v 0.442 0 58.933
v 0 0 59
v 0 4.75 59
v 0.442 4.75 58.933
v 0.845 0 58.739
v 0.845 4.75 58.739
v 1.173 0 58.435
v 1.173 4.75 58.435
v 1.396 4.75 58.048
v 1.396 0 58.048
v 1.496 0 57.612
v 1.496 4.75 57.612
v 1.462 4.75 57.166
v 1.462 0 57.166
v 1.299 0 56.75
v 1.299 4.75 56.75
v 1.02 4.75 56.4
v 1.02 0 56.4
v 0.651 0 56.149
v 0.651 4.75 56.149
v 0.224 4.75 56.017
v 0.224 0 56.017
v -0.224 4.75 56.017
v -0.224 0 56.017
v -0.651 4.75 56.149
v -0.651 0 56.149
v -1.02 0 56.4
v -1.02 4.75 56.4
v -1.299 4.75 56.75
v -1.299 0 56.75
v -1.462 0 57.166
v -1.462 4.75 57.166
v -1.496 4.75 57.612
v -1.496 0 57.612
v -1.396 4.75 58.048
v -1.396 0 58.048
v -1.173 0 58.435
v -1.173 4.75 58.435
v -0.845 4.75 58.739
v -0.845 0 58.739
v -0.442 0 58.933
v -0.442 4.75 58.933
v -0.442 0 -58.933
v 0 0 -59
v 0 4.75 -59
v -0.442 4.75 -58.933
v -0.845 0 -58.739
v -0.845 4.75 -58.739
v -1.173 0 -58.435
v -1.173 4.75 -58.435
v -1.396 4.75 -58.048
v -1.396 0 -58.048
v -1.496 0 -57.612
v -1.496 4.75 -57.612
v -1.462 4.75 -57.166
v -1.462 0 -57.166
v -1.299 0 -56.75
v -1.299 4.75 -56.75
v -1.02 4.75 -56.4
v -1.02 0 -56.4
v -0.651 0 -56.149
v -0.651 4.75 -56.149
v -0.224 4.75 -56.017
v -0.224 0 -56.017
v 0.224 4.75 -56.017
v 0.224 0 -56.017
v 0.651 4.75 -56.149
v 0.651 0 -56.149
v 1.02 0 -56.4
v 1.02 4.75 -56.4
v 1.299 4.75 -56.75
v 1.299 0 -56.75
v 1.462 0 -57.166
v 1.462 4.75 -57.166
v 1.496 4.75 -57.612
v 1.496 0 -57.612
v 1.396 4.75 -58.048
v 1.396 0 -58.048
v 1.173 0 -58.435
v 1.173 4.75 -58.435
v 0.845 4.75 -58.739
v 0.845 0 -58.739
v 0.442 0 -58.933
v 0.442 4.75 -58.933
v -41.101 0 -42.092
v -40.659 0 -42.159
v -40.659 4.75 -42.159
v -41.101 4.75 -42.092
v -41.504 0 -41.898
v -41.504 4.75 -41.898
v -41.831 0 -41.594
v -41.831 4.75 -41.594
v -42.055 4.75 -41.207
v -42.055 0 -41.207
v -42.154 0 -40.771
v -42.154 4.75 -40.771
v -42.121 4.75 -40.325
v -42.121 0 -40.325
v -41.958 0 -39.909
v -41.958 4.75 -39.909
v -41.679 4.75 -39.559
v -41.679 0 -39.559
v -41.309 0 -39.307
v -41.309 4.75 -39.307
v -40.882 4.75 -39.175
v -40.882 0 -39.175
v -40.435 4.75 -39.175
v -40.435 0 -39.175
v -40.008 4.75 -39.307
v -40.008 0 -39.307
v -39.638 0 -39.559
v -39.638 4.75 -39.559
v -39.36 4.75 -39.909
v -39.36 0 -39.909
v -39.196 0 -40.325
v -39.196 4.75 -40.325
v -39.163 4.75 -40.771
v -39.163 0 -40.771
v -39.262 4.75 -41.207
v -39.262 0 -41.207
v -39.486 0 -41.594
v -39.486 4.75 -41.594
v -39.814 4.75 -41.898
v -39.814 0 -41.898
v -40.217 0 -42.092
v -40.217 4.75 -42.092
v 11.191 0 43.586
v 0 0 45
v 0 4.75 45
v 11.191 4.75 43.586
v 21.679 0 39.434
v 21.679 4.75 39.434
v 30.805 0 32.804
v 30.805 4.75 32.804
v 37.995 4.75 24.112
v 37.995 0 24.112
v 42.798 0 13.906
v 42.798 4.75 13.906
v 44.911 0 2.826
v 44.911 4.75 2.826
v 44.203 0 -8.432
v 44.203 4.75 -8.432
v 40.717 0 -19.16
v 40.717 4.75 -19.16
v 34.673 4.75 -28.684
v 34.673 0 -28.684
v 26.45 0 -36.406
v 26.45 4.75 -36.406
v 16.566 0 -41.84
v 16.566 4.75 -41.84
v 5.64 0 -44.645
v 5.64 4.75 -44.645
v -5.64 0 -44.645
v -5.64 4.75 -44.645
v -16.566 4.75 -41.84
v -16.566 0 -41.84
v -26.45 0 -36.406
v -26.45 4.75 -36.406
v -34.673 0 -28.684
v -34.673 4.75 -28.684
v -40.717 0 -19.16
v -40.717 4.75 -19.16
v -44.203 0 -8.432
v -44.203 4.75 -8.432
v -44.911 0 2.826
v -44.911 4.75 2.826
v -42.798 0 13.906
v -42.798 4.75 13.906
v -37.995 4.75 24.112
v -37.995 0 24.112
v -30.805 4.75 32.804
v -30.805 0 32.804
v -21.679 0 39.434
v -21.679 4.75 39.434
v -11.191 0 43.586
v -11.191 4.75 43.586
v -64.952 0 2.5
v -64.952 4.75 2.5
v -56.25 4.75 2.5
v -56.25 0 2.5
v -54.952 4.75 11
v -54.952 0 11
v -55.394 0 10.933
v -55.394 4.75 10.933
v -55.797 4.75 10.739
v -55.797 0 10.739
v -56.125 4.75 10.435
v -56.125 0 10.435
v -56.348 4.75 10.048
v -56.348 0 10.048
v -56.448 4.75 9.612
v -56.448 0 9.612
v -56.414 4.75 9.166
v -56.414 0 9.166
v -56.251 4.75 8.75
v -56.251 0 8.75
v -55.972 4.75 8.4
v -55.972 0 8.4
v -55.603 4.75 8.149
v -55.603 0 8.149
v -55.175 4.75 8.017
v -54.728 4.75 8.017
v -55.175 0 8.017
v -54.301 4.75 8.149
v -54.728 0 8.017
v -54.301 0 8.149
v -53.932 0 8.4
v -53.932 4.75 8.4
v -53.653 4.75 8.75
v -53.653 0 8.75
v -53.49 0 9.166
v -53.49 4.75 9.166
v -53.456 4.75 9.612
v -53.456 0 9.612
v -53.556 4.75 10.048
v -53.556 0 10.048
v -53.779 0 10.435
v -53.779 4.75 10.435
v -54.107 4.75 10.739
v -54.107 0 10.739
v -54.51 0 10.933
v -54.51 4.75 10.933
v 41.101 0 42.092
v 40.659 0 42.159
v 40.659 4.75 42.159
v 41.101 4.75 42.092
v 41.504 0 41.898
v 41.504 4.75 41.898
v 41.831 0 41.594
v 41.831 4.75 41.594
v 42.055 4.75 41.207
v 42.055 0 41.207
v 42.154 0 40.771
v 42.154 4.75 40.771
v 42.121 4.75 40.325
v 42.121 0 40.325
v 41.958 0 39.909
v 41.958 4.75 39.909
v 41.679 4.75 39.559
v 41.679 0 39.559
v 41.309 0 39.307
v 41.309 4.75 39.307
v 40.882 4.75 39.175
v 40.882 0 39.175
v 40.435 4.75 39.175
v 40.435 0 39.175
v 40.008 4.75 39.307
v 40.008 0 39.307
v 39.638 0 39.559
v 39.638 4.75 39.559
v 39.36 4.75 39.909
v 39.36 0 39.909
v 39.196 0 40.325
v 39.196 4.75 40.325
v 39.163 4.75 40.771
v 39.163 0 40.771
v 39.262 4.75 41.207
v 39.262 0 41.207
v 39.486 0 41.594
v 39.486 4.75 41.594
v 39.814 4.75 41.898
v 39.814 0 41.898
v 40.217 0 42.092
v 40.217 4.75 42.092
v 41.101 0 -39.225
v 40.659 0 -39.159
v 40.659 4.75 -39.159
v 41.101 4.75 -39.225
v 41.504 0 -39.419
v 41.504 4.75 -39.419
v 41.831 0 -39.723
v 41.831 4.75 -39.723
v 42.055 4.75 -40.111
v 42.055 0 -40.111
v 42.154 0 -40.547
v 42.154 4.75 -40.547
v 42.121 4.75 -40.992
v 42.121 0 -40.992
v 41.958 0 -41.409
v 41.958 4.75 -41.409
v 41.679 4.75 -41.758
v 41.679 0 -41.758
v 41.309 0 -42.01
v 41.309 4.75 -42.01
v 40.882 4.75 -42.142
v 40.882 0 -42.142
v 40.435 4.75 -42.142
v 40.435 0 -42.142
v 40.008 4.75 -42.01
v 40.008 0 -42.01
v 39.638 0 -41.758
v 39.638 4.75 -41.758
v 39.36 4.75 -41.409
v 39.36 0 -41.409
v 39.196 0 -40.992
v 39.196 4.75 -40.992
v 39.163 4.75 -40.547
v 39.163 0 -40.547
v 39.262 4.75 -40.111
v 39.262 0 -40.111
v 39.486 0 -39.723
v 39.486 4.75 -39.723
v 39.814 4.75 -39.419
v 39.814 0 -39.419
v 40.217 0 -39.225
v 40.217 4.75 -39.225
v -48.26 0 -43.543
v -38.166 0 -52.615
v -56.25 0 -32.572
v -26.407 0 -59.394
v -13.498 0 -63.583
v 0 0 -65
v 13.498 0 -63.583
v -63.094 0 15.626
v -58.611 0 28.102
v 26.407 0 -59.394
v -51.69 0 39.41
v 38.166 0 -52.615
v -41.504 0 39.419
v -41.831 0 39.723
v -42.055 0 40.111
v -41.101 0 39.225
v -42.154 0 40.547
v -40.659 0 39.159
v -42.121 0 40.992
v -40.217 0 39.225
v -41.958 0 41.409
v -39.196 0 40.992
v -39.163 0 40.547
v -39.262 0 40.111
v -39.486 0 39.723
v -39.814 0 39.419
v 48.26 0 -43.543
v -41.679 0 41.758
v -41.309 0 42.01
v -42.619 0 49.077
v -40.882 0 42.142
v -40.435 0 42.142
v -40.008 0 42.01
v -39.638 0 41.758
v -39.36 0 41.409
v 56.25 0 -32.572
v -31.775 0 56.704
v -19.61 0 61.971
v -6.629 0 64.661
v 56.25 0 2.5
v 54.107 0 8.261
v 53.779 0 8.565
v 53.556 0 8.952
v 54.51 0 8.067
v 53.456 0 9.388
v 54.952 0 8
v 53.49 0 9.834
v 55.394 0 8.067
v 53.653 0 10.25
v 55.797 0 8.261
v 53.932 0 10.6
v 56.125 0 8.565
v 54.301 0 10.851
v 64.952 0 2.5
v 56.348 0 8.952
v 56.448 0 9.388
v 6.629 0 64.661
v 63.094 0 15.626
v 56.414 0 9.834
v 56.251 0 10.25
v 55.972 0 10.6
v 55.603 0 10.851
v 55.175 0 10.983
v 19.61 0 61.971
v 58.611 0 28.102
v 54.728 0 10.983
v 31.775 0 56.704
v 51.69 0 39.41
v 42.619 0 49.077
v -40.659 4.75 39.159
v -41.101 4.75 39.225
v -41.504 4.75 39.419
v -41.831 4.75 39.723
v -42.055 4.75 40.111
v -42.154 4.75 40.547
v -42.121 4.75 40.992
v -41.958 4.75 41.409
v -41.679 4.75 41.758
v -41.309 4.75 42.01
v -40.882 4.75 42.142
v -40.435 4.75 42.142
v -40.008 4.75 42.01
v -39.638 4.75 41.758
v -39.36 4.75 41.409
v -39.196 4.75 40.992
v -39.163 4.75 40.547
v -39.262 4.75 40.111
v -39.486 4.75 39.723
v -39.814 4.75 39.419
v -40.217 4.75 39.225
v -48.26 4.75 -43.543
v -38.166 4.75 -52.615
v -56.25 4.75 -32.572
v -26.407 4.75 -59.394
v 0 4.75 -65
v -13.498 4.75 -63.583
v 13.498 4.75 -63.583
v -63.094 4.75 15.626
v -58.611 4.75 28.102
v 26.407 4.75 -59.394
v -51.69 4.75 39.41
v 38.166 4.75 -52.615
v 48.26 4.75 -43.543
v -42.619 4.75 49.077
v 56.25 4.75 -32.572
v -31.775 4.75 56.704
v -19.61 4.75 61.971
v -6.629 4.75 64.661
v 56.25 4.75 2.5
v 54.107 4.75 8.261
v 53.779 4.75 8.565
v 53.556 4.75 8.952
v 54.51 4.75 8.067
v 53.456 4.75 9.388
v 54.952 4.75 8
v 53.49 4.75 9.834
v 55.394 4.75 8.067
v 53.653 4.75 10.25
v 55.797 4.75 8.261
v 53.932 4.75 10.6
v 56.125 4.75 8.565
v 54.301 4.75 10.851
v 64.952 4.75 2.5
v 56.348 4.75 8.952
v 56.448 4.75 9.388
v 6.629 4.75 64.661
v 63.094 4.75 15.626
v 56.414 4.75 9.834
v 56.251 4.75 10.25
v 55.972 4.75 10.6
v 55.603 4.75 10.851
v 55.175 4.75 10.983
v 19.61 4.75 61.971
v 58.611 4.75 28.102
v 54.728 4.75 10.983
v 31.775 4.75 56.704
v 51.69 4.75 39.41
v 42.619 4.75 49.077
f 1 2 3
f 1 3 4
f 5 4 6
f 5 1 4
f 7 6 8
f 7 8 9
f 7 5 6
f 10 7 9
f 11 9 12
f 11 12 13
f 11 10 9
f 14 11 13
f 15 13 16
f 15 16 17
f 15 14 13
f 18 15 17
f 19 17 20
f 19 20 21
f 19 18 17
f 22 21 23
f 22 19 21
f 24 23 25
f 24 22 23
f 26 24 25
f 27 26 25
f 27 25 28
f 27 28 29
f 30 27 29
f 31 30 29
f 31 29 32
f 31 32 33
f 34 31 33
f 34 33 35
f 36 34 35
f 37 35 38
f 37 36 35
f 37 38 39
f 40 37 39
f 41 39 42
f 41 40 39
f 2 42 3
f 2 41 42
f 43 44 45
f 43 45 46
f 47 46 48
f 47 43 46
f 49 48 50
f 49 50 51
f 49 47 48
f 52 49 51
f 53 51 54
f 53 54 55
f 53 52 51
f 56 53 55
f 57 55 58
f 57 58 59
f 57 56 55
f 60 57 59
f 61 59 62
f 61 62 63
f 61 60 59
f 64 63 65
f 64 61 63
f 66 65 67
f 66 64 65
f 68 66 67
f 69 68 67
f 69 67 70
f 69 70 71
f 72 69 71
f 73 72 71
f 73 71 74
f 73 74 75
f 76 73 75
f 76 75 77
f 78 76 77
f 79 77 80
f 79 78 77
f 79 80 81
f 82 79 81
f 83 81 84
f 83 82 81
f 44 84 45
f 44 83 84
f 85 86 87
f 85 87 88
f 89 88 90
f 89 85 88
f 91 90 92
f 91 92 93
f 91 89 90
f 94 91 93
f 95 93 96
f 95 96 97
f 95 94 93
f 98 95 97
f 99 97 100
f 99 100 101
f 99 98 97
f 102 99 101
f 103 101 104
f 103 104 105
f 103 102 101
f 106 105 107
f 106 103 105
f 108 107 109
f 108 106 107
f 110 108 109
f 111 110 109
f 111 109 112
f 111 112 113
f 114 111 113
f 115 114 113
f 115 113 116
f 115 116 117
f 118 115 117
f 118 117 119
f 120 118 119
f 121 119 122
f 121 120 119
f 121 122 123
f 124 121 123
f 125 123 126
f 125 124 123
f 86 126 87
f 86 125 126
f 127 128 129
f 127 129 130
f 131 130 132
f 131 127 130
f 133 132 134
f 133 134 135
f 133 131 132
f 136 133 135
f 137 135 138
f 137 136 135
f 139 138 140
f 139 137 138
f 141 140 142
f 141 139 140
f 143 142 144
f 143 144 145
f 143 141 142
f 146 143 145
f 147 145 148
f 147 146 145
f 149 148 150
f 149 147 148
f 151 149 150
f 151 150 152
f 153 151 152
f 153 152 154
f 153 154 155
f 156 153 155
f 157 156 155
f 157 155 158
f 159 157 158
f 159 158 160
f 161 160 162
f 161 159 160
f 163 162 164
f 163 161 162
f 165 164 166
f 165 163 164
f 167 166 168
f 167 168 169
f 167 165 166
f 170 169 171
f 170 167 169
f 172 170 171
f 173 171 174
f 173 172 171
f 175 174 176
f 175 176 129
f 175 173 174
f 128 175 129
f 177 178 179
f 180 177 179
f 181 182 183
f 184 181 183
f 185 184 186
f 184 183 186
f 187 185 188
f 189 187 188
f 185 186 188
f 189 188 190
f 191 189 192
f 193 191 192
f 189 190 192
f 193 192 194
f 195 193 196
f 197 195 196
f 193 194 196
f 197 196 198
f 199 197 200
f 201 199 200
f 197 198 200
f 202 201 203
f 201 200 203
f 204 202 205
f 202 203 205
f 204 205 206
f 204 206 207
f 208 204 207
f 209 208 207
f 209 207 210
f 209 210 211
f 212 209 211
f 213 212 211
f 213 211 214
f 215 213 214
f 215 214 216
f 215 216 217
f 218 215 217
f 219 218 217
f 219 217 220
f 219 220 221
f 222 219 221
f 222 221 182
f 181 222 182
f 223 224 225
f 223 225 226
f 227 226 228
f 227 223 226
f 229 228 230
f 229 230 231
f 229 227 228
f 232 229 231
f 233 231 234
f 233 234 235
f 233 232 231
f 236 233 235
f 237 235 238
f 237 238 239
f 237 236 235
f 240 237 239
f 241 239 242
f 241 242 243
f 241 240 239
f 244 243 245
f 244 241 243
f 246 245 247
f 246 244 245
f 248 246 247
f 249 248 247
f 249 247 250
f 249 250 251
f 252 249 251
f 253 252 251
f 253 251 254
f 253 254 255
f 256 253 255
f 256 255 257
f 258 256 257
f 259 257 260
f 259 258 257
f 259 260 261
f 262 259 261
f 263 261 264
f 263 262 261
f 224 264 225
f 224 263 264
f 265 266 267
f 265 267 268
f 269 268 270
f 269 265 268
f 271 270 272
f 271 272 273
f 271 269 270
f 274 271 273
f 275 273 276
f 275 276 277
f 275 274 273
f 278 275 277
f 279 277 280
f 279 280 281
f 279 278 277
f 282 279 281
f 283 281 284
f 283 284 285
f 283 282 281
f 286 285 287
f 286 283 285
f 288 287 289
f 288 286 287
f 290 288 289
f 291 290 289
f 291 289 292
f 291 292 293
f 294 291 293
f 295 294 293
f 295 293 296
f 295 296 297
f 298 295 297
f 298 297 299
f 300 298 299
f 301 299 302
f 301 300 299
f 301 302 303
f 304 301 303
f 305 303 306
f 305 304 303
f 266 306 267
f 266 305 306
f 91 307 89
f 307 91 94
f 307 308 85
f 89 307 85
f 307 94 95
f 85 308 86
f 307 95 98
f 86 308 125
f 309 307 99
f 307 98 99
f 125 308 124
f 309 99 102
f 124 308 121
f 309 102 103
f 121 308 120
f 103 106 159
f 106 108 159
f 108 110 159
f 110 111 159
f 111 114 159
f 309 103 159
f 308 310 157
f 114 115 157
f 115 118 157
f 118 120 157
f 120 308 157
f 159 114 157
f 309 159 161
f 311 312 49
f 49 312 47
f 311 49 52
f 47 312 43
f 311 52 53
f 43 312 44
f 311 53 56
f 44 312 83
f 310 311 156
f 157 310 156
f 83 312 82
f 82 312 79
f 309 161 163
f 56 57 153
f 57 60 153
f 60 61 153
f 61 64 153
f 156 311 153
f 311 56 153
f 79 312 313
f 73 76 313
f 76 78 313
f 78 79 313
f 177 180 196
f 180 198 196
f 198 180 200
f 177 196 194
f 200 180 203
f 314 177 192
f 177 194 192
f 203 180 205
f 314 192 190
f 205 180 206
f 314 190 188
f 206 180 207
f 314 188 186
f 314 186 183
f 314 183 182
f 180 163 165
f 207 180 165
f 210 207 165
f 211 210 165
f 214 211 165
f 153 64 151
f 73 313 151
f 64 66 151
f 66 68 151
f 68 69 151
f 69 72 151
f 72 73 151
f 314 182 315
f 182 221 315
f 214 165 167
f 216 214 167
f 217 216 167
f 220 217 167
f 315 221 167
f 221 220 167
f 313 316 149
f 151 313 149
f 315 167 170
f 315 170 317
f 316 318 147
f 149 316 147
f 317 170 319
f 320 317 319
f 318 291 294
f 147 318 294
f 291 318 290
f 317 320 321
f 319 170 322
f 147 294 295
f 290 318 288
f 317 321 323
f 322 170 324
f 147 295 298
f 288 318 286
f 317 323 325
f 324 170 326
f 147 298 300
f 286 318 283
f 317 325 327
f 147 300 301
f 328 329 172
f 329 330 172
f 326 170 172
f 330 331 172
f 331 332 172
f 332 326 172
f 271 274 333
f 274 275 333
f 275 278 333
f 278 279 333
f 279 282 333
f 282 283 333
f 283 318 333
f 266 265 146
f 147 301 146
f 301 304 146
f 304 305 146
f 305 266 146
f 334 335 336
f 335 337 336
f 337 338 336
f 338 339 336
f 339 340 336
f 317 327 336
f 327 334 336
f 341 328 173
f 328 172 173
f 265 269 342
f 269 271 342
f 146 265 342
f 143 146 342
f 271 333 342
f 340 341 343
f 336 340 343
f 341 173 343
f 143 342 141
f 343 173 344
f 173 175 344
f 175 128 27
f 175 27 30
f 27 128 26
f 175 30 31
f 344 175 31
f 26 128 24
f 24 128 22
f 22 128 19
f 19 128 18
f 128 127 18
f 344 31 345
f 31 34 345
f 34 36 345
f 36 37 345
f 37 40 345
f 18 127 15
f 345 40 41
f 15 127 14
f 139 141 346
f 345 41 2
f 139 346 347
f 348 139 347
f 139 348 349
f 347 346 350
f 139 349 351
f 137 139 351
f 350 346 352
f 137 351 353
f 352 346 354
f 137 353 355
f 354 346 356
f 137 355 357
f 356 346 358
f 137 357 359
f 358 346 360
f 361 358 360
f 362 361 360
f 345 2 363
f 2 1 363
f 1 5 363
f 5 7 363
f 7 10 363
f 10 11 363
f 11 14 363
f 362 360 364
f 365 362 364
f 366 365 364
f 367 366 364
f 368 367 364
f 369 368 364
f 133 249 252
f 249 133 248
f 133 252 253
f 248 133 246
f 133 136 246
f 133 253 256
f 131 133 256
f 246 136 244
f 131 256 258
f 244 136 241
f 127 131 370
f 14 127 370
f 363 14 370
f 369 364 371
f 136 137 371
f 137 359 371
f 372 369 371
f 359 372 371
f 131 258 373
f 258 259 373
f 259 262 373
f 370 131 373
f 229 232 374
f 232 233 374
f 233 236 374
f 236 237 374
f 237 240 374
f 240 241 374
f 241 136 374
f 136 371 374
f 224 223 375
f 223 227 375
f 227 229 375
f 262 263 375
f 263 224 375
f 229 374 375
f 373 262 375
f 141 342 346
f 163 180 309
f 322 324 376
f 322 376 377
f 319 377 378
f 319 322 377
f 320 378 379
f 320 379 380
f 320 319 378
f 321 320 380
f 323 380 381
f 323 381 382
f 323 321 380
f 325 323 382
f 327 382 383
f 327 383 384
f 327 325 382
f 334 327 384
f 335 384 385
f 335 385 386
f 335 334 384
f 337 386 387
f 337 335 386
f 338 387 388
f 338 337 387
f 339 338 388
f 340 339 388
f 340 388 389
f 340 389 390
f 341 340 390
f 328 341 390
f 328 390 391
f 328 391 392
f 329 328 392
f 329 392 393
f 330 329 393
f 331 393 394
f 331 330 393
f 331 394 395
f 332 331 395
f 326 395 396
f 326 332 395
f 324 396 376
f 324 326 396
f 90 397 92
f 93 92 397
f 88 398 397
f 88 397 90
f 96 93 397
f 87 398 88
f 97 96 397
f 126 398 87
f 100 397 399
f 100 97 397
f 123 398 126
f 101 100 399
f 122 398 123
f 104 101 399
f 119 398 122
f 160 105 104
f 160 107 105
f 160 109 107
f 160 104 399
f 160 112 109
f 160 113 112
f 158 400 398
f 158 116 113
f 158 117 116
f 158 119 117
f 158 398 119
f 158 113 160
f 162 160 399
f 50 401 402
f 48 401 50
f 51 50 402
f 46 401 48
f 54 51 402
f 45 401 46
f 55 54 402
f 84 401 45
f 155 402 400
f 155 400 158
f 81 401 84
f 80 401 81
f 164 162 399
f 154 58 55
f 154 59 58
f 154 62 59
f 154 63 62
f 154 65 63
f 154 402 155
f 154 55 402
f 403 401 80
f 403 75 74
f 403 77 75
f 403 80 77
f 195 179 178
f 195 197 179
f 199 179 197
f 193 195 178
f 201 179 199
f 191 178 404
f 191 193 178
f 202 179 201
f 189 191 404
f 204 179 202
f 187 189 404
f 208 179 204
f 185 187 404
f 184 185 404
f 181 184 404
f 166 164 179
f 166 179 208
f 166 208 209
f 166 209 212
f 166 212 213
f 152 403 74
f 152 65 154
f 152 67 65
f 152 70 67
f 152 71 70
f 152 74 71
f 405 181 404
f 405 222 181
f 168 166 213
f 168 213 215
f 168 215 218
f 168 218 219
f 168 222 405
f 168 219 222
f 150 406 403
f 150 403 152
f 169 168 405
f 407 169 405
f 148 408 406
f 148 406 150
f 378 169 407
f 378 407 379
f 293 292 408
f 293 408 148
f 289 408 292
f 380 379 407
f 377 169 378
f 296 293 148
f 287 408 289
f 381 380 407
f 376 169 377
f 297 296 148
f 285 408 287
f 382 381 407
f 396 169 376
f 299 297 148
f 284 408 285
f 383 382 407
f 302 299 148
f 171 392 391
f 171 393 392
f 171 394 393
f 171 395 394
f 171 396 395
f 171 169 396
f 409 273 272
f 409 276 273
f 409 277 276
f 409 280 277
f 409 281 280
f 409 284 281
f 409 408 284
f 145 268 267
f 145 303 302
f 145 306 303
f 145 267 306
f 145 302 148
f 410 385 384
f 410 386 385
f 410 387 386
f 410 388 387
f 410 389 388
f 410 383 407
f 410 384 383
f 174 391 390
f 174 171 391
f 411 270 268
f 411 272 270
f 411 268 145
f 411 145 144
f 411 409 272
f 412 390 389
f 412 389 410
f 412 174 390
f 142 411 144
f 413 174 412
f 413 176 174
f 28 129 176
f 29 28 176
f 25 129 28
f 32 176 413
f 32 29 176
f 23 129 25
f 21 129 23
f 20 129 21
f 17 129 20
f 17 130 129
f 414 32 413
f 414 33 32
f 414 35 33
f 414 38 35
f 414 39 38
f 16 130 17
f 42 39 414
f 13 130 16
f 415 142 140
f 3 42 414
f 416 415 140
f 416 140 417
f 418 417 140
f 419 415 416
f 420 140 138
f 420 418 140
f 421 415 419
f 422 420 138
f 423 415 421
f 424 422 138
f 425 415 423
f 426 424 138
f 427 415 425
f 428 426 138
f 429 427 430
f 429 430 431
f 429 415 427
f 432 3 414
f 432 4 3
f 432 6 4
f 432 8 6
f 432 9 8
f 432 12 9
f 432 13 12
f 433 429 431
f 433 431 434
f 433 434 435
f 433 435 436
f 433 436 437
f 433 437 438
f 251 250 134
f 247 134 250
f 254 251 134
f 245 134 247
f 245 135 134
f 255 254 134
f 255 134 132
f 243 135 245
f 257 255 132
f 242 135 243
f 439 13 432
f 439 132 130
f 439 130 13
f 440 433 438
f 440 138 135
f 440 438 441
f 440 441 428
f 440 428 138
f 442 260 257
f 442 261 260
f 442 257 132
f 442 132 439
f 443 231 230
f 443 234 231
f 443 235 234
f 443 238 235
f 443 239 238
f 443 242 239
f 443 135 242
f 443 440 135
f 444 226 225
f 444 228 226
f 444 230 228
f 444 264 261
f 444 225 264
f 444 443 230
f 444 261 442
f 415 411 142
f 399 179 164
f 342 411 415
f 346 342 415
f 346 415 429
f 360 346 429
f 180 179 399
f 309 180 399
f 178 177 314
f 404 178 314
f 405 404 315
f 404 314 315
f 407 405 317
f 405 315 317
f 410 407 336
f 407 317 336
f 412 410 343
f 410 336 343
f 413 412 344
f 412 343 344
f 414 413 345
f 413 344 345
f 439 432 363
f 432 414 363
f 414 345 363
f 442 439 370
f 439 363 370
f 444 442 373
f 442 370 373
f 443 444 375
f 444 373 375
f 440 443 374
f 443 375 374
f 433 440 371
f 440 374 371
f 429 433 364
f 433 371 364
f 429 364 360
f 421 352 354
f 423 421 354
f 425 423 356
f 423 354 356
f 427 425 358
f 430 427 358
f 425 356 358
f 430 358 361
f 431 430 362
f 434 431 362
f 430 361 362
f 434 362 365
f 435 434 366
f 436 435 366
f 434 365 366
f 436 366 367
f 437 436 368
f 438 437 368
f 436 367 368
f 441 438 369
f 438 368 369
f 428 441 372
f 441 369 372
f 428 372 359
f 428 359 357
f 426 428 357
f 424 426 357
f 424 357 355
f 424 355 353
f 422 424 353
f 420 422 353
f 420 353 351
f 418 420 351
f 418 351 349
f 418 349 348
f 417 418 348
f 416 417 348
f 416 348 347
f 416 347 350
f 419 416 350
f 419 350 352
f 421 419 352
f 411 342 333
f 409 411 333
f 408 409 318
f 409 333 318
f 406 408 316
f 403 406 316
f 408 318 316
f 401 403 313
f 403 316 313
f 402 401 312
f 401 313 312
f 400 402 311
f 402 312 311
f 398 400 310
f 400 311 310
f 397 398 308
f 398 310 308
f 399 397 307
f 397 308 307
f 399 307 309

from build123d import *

# Parameters (mm, degrees)
SKETCH1_R           = 65
SKETCH1_R_2         = 1.5
SKETCH1_R_3         = 45
BOSS_EXTRUDE1_DEPTH = 4.75
SKETCH3_W           = 10
SKETCH3_H           = 5
CUT_EXTRUDE1_DEPTH  = 5
CUT_EXTRUDE2_DEPTH  = 93.012567076
SKETCH5_R           = 1.5
CUT_EXTRUDE3_DEPTH  = 93.012567076


with BuildPart() as part:
    # Sketch1 → Boss-Extrude1 (new body)
    with BuildSketch(Plane(origin=(0, 0, 0), x_dir=(1, 0, 0), z_dir=(0, 1, 0))):
        Circle(SKETCH1_R)
        with Locations((0, -57.5)):
            Circle(SKETCH1_R_2, mode=Mode.SUBTRACT)
        with Locations((40.658639918, -40.658639918)):
            Circle(SKETCH1_R_2, mode=Mode.SUBTRACT)
        with Locations((40.658639918, 40.658639918)):
            Circle(SKETCH1_R_2, mode=Mode.SUBTRACT)
        with Locations((0, 57.5)):
            Circle(SKETCH1_R_2, mode=Mode.SUBTRACT)
        with Locations((-40.658639918, 40.658639918)):
            Circle(SKETCH1_R_2, mode=Mode.SUBTRACT)
        with Locations((-40.658639918, -40.658639918)):
            Circle(SKETCH1_R_2, mode=Mode.SUBTRACT)
        Circle(SKETCH1_R_3, mode=Mode.SUBTRACT)
    extrude(amount=BOSS_EXTRUDE1_DEPTH)

    # Sketch3 → Cut-Extrude1 (cut)
    with BuildSketch(Plane(origin=(0, 4.75, 0), x_dir=(1, 0, 0), z_dir=(0, 1, 0))):
        with Locations((61.25, 0)):
            Rectangle(SKETCH3_W, SKETCH3_H)
        with Locations((-61.25, 0)):
            Rectangle(SKETCH3_W, SKETCH3_H)
    extrude(amount=-CUT_EXTRUDE1_DEPTH, mode=Mode.SUBTRACT)

    # Sketch4 → Cut-Extrude2 (cut, through all)
    with BuildSketch(Plane(origin=(0, 4.75, 0), x_dir=(1, 0, 0), z_dir=(0, 1, 0))):
        with BuildLine():
            Line((-64.951905284, 2.5), (-56.25, 2.5))
            Line((-56.25, 2.5), (-56.25, 32.572035552))
            ThreePointArc((-56.25, 32.572035552), (-62.438428004, 18.067725599), (-64.951905284, 2.5))
        make_face()
        with BuildLine():
            ThreePointArc((64.951905284, 2.5), (62.438428004, 18.067725599), (56.25, 32.572035552))
            Line((56.25, 32.572035552), (56.25, 2.5))
            Line((56.25, 2.5), (64.951905284, 2.5))
        make_face()
    extrude(amount=-CUT_EXTRUDE2_DEPTH, mode=Mode.SUBTRACT)

    # Sketch5 → Cut-Extrude3 (cut, through all)
    with BuildSketch(Plane.XZ):
        with Locations((54.951905284, 9.5)):
            Circle(SKETCH5_R)
        with Locations((-54.951905284, 9.5)):
            Circle(SKETCH5_R)
    extrude(amount=-CUT_EXTRUDE3_DEPTH, mode=Mode.SUBTRACT)


solid = part.part
